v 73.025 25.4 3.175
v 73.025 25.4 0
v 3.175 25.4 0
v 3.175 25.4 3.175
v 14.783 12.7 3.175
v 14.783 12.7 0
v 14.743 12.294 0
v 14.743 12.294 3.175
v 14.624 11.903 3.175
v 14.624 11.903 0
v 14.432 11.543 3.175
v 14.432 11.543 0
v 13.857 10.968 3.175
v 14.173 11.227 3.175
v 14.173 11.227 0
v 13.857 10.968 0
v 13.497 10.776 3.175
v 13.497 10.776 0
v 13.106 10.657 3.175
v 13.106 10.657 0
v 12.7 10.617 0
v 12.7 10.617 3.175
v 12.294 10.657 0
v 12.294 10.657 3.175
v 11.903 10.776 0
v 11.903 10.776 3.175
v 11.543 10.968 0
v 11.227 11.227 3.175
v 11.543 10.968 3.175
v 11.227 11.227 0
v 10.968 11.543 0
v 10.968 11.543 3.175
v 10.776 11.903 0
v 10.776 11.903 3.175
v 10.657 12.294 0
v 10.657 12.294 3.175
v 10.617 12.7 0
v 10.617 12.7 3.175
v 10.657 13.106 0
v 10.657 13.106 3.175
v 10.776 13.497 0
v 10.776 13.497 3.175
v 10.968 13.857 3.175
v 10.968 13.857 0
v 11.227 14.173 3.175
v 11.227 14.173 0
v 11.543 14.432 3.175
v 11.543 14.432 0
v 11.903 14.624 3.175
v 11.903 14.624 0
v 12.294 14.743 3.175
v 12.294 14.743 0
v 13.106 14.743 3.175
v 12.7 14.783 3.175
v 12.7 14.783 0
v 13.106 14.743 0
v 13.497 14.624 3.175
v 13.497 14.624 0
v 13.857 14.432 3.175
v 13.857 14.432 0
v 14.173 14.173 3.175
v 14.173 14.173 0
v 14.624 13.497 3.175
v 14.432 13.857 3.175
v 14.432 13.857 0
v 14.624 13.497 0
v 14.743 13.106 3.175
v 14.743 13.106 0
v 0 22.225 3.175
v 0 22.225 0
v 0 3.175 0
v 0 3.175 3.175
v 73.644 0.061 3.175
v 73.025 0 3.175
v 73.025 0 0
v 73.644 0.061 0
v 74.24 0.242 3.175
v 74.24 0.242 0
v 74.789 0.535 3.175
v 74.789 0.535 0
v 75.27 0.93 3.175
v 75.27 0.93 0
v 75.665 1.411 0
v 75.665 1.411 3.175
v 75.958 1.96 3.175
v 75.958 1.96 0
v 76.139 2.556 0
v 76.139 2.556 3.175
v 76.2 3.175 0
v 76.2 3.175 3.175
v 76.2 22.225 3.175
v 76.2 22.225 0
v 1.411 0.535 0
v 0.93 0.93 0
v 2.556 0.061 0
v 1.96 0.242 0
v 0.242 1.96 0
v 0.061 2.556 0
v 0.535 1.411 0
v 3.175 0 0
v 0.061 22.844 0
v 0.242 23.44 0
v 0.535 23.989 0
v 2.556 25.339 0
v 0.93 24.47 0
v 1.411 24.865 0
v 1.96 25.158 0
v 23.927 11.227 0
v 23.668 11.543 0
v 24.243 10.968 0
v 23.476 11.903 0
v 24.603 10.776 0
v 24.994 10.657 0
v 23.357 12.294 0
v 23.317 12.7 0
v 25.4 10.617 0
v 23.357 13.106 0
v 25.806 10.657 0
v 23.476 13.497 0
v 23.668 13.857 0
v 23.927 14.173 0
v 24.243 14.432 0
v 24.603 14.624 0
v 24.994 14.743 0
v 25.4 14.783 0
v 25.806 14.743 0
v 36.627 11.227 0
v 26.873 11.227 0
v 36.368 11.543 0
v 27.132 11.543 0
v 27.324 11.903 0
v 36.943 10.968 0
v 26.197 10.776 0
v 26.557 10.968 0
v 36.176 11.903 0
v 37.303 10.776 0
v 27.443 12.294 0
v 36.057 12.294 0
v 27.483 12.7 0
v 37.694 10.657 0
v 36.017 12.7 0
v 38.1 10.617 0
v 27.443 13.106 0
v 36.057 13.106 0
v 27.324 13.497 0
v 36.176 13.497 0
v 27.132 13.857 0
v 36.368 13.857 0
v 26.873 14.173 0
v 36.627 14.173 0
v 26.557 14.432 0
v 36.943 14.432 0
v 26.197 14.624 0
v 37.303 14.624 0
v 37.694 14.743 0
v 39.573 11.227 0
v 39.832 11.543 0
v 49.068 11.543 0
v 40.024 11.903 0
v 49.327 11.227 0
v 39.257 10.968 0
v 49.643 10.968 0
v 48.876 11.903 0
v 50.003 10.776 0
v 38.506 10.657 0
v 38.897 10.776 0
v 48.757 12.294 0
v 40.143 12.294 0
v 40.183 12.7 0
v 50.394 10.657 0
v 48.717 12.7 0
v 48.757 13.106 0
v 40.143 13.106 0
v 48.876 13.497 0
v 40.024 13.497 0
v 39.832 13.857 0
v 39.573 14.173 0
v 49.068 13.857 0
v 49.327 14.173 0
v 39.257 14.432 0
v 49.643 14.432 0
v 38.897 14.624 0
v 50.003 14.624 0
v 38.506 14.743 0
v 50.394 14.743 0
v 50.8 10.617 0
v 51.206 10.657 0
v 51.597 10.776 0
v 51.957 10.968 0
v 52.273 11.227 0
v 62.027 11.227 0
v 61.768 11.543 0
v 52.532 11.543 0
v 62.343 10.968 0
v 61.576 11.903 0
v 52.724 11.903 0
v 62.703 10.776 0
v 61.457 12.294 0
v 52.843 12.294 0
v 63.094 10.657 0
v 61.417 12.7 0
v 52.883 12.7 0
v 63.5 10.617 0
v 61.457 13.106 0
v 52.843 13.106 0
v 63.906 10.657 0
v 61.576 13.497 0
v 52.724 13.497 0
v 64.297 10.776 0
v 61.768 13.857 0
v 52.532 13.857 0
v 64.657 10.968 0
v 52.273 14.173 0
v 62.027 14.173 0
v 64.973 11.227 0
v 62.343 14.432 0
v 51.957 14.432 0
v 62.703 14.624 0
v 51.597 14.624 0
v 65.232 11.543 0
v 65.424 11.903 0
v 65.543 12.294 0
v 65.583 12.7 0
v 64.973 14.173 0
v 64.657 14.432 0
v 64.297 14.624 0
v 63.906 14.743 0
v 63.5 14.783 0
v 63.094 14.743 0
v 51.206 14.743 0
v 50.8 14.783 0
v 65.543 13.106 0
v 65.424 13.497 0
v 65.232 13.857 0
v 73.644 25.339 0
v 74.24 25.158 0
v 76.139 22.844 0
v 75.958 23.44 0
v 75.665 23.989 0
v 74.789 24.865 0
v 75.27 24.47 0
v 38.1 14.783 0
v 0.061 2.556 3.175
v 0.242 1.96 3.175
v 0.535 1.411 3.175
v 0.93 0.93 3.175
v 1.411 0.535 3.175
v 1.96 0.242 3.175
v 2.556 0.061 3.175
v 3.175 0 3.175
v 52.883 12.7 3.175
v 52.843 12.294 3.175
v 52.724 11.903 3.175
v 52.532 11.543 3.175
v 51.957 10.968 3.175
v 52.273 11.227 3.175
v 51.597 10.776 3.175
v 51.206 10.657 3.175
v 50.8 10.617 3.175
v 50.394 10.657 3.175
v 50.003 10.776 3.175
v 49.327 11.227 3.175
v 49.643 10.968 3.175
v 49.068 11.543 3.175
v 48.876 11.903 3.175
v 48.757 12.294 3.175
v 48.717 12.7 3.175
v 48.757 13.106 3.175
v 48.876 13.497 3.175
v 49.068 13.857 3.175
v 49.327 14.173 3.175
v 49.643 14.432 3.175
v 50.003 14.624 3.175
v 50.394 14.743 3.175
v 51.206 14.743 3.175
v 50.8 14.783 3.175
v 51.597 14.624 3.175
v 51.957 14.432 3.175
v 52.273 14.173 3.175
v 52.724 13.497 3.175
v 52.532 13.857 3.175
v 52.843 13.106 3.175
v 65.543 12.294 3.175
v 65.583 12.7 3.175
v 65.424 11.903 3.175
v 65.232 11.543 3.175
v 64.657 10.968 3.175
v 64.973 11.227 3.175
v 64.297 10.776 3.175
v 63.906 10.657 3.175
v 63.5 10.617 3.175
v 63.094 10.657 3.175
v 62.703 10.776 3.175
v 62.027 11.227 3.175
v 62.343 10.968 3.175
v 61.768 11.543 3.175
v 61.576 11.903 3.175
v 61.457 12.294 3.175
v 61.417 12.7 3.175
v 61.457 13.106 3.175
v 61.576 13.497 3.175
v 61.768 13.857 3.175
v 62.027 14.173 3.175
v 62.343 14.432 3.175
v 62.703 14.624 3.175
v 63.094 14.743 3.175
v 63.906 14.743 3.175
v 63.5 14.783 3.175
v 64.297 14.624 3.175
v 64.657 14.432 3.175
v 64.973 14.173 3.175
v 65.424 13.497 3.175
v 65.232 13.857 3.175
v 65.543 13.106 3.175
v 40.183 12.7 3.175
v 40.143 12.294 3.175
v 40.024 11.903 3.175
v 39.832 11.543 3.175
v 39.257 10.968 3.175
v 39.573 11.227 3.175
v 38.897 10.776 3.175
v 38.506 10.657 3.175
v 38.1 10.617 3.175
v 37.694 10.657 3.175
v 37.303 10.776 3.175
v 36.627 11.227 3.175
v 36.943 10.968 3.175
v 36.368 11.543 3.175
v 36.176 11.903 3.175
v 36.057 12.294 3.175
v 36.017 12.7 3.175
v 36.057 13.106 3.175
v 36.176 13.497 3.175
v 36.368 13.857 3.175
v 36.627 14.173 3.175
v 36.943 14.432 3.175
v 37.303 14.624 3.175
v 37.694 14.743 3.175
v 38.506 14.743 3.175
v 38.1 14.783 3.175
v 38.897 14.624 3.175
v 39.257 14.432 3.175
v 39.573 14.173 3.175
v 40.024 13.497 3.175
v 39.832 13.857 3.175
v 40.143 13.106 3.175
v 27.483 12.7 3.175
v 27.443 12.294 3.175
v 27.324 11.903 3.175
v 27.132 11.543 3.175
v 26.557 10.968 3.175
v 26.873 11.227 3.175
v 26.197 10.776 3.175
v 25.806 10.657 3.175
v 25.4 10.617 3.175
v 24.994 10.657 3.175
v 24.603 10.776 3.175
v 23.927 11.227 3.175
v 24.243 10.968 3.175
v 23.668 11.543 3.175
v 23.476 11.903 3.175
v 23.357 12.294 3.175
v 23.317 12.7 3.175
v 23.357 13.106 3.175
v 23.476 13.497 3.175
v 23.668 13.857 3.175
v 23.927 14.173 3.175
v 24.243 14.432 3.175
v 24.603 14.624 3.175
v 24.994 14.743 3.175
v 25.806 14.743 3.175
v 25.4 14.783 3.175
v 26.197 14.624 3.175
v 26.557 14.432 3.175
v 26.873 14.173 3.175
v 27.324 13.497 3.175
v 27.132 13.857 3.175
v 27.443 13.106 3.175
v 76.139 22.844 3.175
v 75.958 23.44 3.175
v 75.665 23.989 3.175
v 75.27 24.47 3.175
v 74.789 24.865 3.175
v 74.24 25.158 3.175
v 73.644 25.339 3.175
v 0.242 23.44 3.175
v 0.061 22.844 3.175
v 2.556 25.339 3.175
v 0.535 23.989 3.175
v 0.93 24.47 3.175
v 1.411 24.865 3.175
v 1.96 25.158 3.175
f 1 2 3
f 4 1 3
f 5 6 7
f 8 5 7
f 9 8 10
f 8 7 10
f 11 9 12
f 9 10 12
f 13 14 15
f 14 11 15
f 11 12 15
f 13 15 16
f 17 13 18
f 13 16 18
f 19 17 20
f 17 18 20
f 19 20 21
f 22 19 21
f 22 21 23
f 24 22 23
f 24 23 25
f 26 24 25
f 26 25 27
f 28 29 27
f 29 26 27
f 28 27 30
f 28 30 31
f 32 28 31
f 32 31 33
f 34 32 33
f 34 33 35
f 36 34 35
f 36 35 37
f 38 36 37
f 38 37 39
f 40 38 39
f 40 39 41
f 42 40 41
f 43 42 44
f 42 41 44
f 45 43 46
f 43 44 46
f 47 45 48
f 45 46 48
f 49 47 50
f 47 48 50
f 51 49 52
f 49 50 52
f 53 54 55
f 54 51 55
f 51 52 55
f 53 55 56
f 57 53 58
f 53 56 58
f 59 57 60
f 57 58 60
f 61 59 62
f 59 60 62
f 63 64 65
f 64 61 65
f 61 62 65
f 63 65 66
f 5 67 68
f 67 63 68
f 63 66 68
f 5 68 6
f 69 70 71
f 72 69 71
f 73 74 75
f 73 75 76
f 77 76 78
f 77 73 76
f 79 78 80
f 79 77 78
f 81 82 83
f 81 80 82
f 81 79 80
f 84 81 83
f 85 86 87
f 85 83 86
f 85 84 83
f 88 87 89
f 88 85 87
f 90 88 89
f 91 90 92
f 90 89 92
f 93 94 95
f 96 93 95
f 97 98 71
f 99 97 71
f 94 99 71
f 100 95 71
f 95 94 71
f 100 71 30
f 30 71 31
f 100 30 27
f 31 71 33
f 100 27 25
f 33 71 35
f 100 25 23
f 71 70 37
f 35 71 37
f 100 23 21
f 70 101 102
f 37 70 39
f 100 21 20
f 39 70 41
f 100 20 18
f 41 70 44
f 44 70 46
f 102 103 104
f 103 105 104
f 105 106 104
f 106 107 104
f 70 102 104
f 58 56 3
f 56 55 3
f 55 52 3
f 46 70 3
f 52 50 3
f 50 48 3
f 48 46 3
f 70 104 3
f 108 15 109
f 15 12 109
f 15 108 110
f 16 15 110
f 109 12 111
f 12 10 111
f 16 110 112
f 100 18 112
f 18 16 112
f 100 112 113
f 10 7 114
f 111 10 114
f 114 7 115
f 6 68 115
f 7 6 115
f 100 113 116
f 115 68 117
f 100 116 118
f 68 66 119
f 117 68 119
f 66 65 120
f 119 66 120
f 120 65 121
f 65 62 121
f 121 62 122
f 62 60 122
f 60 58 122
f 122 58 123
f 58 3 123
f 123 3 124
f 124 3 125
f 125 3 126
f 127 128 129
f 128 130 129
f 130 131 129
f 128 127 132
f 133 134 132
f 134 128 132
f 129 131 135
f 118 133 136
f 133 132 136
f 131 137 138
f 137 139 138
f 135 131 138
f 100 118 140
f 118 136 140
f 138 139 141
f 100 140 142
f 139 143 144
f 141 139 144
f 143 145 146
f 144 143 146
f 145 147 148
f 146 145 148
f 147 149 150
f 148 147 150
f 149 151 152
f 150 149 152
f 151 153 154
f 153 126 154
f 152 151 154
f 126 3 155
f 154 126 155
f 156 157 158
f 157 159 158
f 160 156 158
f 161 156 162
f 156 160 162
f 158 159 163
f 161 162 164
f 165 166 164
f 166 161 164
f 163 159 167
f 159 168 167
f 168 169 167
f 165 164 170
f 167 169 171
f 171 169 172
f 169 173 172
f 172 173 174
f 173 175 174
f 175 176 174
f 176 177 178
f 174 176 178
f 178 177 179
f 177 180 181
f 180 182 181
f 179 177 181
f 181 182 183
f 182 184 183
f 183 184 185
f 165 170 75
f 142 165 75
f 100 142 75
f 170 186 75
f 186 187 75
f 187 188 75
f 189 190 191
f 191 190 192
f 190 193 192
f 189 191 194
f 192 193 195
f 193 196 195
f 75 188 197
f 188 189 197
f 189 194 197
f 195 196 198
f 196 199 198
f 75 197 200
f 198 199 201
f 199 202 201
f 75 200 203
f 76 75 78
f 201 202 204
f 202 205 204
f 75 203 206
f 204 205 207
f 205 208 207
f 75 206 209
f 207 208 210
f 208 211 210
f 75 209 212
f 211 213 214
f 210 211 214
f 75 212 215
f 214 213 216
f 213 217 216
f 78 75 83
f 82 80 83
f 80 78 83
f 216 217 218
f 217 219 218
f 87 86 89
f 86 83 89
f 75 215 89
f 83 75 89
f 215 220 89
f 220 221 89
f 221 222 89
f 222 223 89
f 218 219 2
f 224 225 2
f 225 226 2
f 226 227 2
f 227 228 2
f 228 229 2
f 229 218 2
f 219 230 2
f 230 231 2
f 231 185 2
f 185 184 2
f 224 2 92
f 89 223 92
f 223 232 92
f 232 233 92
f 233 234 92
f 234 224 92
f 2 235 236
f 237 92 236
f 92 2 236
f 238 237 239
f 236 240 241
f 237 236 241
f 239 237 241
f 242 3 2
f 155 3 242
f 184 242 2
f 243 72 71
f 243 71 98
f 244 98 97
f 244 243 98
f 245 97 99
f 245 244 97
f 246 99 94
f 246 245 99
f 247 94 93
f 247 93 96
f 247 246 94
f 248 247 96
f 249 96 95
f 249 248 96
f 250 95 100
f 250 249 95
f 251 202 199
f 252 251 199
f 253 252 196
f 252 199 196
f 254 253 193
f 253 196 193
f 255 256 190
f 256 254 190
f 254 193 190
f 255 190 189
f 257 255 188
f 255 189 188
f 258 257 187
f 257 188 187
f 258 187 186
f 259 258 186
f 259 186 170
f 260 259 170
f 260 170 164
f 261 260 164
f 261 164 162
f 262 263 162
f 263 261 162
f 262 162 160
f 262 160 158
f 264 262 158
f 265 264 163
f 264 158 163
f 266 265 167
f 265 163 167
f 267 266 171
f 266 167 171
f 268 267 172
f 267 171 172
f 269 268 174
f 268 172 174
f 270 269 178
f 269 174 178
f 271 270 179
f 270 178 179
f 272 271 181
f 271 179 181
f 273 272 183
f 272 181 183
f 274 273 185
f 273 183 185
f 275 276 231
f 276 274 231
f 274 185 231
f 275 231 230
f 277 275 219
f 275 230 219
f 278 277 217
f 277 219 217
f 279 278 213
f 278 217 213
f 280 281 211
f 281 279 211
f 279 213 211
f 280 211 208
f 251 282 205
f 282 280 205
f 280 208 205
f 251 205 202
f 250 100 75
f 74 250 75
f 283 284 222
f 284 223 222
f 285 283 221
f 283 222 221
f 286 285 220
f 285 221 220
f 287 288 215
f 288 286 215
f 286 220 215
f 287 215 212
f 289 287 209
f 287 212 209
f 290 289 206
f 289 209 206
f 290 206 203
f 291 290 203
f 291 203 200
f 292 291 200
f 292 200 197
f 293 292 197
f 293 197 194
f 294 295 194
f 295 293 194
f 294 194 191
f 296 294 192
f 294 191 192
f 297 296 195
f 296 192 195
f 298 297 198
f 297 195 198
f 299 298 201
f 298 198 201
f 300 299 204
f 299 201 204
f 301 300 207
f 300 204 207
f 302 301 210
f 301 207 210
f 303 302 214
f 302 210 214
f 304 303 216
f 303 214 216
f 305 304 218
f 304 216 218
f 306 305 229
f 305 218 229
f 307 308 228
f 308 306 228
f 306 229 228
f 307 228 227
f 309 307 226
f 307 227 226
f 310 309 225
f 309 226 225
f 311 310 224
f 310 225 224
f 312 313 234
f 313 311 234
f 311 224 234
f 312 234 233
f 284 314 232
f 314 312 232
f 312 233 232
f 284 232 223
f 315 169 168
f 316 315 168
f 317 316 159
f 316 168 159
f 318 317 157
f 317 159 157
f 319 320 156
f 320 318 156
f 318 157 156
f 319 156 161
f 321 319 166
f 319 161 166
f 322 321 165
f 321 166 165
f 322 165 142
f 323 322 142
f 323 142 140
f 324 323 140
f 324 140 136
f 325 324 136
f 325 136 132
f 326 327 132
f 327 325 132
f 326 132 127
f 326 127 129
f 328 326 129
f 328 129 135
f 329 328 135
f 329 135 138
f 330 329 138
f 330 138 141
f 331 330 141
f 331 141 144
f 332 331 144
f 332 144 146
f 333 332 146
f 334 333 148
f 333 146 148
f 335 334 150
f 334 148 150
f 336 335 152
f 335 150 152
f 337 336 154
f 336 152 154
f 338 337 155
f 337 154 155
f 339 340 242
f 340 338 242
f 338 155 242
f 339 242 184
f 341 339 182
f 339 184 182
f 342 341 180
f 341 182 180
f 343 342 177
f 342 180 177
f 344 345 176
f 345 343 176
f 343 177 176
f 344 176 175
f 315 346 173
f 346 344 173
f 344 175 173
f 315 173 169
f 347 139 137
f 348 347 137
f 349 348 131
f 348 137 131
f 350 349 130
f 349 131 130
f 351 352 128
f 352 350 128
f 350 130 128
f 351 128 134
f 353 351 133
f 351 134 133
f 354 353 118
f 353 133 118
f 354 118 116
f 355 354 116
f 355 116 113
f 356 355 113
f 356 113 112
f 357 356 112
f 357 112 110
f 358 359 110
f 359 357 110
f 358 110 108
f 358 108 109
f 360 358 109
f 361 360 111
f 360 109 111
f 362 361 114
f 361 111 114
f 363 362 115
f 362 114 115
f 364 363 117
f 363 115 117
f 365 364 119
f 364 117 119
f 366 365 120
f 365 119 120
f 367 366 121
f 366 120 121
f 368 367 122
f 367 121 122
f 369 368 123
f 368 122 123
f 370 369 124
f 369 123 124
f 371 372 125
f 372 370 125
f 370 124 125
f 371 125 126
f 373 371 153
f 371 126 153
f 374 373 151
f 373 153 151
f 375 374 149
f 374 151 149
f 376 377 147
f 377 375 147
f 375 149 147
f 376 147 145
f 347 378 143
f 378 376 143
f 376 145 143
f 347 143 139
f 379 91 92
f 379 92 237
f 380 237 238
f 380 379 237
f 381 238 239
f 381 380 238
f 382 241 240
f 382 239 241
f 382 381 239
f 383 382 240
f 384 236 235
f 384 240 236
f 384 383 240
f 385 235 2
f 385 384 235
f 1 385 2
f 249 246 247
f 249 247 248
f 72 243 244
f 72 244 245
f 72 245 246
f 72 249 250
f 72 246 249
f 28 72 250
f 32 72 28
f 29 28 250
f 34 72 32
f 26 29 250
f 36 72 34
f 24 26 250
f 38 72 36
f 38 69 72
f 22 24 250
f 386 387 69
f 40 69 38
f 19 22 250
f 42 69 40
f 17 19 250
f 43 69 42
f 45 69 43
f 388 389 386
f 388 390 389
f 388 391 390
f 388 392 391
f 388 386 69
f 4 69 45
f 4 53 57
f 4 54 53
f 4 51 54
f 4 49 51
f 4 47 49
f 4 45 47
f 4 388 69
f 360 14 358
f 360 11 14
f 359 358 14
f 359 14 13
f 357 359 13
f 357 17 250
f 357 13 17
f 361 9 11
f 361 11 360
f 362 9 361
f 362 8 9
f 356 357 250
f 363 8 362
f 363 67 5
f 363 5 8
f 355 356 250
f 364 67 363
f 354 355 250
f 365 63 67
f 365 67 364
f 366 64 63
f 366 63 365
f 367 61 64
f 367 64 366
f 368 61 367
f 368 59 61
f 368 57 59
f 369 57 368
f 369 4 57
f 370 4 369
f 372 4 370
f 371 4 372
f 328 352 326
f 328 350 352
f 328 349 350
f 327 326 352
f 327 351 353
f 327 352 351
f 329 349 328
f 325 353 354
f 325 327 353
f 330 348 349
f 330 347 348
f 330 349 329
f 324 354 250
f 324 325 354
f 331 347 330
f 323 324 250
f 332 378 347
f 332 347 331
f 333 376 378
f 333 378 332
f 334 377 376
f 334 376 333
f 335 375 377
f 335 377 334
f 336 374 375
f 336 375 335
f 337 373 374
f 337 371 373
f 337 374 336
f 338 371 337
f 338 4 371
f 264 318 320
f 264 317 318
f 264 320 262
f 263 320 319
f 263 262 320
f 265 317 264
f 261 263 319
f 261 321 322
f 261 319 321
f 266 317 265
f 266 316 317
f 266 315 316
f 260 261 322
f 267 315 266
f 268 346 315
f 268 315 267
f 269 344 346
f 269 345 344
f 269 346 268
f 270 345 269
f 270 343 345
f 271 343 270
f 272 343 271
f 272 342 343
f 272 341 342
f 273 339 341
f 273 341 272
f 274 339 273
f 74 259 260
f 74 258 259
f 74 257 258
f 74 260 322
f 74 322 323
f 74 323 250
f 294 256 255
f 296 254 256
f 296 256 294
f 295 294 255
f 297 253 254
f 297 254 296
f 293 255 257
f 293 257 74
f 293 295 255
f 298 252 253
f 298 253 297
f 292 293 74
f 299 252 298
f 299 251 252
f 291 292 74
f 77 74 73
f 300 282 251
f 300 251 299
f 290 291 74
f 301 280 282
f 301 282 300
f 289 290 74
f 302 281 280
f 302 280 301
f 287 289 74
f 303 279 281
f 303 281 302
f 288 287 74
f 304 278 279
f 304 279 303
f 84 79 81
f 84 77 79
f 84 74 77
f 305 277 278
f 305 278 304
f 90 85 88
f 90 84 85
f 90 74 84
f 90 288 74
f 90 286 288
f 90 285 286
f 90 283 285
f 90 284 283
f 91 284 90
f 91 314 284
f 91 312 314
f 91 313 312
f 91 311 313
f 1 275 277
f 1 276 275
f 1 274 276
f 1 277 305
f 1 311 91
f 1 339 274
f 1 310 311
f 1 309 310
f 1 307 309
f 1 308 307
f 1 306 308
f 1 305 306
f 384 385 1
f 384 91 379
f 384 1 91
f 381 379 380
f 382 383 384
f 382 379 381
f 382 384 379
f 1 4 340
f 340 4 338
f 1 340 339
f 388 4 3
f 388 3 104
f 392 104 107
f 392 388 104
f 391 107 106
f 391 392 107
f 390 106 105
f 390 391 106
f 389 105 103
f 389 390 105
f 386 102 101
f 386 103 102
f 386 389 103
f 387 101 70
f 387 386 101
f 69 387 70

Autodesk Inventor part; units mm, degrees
ref_plane "YZ Plane" through (0, 0, 0) normal (1, 0, 0) x (0, 1, 0)
ref_plane "XZ Plane" through (0, 0, 0) normal (0, 1, 0) x (-1, 0, 0)
ref_plane "XY Plane" through (0, 0, 0) normal (0, 0, 1) x (1, 0, 0)
sketch "Sketch1" plane through (0, 0, 0) normal (0, 0, 1) x (1, 0, 0)
  line L0 (0, 0) -> (76.2, 0)
  line L1 (76.2, 0) -> (76.2, 25.4)
  line L2 (76.2, 25.4) -> (0, 25.4)
  line L3 (0, 25.4) -> (0, 0)
  circle A0 centre (12.7, 12.7) radius 2.0828
  circle A1 centre (25.4, 12.7) radius 2.0828
  circle A2 centre (38.1, 12.7) radius 2.0828
  circle A3 centre (50.8, 12.7) radius 2.0828
  circle A4 centre (63.5, 12.7) radius 2.0828
  dimension "d0" = 76.2
  dimension "d1" = 25.4
  dimension "d2" = 4.1656
  dimension "d3" = 12.7
  dimension "d4" = 12.7
  dimension "d7" = 12.7
extrude "Extrusion1" add sketch "Sketch1" along normal blind 3.175
fillet "Fillet1" radius 3.175 4 edges at (0, 25.4, 1.5875) (0, 0, 1.5875) (76.2, 0, 1.5875) (76.2, 25.4, 1.5875)
properties part number "3 X 1 Spacer" material "Aluminum 6061"
